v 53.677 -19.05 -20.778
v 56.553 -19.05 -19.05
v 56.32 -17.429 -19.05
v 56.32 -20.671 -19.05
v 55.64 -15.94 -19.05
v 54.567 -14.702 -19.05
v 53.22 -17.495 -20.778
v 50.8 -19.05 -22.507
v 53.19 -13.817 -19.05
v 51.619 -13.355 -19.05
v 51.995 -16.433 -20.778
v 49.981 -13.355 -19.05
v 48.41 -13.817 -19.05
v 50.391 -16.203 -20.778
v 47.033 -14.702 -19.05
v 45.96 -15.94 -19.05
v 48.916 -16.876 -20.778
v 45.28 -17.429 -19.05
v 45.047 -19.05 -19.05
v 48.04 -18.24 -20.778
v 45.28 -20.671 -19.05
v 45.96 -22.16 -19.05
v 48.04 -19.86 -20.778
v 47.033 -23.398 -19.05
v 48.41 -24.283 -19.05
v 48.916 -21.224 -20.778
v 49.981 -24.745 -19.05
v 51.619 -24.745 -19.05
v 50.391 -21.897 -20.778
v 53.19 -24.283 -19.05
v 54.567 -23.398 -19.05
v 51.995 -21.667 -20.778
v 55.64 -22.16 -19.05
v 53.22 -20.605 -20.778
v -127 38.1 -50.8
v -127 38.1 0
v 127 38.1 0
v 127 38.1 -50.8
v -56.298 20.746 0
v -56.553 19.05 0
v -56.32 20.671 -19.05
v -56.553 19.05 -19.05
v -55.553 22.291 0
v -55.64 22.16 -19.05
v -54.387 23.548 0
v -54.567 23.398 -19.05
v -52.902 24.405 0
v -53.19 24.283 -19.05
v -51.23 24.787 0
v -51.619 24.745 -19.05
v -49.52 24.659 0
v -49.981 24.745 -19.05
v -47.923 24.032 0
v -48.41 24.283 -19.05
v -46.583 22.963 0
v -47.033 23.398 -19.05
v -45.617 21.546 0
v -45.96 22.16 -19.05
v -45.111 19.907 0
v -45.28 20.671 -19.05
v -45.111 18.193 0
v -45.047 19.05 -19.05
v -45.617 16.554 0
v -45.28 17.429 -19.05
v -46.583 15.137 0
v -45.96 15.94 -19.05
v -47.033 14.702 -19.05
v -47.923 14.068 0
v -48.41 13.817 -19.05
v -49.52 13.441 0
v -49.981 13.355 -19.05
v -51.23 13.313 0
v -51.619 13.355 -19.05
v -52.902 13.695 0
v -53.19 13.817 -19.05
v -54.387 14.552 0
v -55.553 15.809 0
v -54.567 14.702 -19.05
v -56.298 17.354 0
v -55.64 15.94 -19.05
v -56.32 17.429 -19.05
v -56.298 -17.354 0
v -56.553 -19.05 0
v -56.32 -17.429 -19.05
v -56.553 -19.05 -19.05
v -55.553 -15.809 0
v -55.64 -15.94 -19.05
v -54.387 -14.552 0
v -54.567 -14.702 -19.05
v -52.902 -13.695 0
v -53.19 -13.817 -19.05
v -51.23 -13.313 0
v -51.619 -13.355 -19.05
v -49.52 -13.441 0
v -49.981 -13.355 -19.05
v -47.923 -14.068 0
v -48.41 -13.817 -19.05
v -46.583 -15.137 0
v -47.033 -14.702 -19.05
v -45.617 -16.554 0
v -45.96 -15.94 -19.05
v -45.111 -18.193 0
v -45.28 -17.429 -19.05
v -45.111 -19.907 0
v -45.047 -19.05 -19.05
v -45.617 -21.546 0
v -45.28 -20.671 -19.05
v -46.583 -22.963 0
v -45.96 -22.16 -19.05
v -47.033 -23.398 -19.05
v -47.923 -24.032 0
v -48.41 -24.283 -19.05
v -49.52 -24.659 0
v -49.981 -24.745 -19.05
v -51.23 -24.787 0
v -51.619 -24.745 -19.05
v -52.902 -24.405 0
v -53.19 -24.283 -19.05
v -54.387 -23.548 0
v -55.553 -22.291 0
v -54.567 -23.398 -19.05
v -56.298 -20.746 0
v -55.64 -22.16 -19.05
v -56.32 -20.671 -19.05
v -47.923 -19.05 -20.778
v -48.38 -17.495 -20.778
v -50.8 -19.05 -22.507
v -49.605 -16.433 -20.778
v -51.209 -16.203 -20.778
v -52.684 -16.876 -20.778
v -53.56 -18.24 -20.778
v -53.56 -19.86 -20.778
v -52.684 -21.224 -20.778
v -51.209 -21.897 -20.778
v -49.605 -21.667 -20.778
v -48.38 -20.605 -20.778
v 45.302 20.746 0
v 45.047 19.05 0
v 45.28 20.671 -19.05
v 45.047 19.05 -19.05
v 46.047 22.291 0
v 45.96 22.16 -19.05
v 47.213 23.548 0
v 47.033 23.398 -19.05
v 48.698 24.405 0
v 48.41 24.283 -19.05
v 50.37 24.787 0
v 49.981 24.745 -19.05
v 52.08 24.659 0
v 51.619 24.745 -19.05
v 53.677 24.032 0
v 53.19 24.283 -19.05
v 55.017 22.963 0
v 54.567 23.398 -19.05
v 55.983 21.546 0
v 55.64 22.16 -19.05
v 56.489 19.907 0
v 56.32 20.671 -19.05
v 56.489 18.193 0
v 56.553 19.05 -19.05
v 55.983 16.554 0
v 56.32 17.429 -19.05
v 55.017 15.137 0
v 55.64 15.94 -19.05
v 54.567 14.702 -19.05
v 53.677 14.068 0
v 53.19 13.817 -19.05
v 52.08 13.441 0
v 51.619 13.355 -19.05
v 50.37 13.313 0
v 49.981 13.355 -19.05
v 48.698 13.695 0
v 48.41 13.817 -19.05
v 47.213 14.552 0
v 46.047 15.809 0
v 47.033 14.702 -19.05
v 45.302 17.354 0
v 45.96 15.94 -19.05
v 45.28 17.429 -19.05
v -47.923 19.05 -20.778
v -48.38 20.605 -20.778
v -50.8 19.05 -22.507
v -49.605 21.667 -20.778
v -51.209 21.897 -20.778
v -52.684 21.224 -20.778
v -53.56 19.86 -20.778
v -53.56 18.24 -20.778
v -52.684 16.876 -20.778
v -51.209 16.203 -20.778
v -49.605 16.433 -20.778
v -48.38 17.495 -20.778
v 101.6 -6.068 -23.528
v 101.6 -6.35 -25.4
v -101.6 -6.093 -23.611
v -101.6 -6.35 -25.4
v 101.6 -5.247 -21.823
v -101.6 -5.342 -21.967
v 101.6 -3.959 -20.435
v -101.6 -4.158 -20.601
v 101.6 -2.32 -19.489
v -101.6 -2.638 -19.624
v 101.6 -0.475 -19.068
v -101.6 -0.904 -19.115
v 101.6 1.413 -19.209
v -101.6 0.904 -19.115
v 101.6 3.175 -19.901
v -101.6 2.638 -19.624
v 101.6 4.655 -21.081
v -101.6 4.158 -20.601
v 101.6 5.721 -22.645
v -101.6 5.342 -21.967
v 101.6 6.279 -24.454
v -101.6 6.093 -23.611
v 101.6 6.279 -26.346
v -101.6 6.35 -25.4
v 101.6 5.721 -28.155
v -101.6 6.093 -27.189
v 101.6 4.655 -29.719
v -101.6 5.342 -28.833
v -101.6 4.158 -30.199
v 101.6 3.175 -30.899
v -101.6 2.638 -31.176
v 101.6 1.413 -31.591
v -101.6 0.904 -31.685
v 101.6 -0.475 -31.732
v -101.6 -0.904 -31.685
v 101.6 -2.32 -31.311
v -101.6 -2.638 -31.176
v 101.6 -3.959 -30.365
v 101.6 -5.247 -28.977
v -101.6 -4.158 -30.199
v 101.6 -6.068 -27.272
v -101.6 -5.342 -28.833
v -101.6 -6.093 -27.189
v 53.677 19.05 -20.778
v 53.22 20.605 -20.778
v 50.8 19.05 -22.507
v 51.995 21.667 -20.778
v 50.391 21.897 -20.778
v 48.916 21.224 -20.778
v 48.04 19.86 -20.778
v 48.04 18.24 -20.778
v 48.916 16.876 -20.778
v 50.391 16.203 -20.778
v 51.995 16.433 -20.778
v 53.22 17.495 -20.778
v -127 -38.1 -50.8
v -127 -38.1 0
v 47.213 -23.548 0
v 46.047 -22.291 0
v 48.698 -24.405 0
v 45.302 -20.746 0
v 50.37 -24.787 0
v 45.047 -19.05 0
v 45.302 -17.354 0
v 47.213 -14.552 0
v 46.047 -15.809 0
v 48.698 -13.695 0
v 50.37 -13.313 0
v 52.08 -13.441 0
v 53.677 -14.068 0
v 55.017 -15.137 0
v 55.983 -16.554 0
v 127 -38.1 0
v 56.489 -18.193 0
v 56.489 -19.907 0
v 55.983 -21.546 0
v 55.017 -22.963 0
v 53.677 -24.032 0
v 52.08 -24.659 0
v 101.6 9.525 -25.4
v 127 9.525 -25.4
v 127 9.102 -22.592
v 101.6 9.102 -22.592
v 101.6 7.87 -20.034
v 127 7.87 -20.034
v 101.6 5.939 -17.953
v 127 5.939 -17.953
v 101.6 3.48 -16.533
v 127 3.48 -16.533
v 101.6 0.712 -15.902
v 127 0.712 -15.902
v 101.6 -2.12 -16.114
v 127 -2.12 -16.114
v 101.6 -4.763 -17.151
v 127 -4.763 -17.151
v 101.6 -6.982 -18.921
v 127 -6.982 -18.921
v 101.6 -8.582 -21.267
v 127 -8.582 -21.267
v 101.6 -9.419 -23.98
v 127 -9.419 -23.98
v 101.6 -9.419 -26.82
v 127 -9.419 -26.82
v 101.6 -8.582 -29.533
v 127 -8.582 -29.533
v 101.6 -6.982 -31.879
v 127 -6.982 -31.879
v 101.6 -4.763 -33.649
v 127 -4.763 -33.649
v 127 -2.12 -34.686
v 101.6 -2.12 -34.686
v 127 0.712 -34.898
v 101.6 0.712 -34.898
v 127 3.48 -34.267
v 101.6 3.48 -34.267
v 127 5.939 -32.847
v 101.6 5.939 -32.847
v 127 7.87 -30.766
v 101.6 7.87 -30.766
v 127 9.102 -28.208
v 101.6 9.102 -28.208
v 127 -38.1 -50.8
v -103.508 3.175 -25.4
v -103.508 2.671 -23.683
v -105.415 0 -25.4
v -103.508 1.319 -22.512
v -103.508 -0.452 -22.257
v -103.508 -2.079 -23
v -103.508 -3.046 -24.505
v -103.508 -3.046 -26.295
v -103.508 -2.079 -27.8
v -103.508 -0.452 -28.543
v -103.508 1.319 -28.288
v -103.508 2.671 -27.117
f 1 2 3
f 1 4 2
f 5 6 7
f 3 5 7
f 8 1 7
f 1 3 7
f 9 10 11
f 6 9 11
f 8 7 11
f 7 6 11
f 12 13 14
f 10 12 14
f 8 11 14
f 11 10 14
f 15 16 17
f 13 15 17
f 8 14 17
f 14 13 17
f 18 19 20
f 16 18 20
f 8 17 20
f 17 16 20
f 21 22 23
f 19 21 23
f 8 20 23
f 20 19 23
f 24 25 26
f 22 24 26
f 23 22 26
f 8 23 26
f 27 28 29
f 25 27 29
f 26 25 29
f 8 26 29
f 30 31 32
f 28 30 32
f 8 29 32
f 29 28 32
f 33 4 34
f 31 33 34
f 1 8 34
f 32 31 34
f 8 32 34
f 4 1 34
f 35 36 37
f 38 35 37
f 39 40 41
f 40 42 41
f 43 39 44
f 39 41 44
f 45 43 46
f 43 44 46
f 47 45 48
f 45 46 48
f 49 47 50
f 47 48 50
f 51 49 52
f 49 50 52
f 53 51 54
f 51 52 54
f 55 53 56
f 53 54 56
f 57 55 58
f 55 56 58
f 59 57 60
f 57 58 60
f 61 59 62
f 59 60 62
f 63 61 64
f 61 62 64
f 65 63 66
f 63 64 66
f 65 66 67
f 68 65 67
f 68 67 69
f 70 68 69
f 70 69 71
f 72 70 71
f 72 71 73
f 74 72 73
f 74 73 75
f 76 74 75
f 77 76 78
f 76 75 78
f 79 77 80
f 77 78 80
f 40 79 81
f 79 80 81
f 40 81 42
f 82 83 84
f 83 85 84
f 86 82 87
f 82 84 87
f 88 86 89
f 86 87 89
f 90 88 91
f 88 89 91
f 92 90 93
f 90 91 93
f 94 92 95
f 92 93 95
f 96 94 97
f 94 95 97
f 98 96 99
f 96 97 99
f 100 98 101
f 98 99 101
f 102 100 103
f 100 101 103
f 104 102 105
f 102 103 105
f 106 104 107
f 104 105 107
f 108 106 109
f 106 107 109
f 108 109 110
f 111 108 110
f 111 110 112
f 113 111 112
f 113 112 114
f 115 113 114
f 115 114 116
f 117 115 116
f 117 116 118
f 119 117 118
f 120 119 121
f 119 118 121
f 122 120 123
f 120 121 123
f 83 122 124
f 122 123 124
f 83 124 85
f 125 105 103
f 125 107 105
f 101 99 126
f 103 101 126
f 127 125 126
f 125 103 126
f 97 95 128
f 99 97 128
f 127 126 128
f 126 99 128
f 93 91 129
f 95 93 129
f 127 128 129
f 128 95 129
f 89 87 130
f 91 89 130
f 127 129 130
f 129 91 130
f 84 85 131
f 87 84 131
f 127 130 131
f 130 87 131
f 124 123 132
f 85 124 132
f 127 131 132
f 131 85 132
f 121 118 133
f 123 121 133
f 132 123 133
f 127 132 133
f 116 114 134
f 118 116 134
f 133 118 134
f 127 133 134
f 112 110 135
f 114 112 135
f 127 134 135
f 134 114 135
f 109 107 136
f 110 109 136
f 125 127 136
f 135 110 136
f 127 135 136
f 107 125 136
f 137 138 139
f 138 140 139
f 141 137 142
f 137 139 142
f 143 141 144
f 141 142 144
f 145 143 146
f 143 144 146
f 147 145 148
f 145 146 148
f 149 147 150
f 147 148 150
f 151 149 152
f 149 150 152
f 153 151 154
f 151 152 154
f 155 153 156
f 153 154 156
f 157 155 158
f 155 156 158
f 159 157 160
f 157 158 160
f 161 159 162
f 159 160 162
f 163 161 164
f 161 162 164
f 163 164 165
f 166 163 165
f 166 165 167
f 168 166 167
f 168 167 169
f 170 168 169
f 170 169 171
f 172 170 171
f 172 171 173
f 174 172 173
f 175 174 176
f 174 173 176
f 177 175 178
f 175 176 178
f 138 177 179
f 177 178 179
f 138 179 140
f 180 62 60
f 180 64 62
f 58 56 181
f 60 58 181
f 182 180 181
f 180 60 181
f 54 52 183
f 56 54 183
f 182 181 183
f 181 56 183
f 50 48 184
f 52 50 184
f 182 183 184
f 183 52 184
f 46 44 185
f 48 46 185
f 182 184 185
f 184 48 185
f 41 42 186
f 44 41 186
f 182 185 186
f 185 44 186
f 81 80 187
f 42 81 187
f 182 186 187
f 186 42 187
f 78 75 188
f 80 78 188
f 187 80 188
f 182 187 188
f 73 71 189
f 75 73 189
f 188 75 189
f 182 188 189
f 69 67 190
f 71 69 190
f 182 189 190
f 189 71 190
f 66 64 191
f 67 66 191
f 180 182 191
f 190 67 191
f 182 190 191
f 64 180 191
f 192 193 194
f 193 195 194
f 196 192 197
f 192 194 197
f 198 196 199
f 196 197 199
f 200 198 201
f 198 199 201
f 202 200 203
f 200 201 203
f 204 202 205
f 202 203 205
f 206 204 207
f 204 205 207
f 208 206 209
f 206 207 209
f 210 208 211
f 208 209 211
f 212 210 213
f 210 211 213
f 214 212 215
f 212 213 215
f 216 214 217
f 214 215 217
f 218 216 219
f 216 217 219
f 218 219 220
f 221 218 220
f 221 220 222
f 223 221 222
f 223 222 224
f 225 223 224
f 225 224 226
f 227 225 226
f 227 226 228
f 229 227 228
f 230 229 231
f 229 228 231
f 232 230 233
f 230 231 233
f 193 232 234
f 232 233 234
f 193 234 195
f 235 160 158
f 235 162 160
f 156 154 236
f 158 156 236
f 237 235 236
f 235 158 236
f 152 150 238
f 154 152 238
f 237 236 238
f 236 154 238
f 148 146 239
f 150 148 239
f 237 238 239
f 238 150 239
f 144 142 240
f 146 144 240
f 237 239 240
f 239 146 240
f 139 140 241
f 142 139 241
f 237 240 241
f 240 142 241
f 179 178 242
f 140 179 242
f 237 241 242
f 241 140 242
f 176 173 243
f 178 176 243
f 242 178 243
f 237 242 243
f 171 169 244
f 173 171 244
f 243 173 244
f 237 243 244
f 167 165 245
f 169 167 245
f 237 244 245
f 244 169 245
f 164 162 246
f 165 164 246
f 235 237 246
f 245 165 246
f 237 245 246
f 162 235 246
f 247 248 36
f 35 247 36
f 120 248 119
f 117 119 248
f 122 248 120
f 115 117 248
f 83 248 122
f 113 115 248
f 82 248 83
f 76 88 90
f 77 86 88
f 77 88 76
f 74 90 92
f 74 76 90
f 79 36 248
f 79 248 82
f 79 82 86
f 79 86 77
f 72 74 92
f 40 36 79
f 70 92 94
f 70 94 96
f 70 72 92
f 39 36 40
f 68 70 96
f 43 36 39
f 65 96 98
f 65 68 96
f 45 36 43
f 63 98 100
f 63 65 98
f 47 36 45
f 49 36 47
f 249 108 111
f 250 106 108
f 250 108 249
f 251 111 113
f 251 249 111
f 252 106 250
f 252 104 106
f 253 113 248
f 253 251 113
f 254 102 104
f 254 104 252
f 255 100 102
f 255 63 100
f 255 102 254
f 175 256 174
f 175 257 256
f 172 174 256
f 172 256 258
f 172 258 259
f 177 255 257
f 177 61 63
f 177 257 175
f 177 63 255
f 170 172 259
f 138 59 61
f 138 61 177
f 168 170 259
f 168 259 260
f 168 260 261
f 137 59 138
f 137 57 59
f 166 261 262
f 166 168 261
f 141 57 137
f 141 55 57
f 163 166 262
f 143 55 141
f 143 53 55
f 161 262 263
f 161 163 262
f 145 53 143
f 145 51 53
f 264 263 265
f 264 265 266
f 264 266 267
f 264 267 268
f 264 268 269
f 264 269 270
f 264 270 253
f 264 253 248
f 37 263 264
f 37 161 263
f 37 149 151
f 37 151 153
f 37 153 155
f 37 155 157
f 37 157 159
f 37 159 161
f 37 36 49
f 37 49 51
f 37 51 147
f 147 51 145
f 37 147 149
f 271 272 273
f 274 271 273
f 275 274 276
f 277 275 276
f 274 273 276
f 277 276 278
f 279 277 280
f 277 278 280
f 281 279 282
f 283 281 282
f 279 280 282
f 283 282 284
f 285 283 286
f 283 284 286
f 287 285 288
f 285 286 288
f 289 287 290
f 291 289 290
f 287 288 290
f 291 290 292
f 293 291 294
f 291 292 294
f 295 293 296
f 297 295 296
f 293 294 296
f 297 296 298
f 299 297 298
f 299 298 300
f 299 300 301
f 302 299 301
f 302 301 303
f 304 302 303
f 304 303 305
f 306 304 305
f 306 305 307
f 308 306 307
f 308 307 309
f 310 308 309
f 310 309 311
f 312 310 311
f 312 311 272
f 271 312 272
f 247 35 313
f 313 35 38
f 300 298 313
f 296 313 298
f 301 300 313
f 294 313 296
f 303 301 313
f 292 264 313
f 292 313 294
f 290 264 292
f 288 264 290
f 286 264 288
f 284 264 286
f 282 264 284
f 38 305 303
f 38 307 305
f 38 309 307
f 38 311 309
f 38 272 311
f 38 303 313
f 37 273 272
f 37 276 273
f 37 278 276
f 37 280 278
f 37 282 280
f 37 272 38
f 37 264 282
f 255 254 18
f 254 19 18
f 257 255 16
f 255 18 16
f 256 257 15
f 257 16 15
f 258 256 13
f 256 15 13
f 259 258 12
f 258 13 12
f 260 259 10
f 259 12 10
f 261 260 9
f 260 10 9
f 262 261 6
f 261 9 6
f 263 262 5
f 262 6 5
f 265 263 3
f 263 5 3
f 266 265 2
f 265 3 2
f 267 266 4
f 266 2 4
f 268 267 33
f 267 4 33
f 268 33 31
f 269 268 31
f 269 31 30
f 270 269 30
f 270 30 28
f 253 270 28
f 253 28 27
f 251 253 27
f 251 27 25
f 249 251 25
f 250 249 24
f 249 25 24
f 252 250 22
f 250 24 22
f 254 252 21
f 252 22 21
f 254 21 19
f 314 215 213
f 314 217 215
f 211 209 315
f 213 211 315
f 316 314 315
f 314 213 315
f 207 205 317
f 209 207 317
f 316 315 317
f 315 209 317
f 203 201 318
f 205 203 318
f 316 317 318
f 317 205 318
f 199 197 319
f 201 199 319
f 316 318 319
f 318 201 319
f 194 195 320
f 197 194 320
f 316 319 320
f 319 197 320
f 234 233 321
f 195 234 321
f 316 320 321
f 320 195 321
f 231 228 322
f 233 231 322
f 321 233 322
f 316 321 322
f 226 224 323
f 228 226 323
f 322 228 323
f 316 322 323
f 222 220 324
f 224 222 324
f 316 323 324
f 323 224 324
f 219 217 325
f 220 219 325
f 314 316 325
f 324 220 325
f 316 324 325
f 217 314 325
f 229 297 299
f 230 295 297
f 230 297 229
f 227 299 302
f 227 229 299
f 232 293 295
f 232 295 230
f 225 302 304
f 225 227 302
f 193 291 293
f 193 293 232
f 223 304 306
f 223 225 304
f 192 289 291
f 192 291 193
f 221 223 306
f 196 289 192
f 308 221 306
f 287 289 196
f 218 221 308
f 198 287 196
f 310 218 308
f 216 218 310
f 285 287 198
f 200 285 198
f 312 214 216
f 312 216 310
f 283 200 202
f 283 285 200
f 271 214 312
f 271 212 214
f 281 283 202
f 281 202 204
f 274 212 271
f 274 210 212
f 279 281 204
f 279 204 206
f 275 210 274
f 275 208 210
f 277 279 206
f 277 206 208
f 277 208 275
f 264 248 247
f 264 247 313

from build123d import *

# Parameters (mm, degrees)
F0_W           = 254
F0_H           = 76.2
F1_DEPTH       = 50.8
F2_D           = 11.5062
F2_DEPTH       = 19.05
F2_TIP         = 3.4568112273
F4_D           = 12.7
F4_DEPTH       = 228.6
F4_CBORE_D     = 19.05
F4_CBORE_DEPTH = 25.4
F4_TIP         = 3.8154649308


with BuildPart() as f1:
    # F0 (on Top) → F1 (new body)
    with BuildSketch(Plane.XY):
        Rectangle(F0_W, F0_H)
    extrude(amount=-F1_DEPTH)

    # F2
    with Locations(Plane.XY):
        with Locations((-50.8, 19.05), (50.8, 19.05), (50.8, -19.05), (-50.8, -19.05)):
            Hole(F2_D / 2, depth=F2_DEPTH)
            with Locations((0, 0, -(F2_DEPTH + F2_TIP / 2))):  # 118° drill point
                Cone(0, F2_D / 2, F2_TIP, mode=Mode.SUBTRACT)

    # F4
    with Locations(Plane.YZ.offset(127)):
        with Locations((0, -25.4)):
            CounterBoreHole(F4_D / 2, F4_CBORE_D / 2, F4_CBORE_DEPTH, depth=F4_DEPTH)
            with Locations((0, 0, -(F4_DEPTH + F4_TIP / 2))):  # 118° drill point
                Cone(0, F4_D / 2, F4_TIP, mode=Mode.SUBTRACT)


solid = f1.part
